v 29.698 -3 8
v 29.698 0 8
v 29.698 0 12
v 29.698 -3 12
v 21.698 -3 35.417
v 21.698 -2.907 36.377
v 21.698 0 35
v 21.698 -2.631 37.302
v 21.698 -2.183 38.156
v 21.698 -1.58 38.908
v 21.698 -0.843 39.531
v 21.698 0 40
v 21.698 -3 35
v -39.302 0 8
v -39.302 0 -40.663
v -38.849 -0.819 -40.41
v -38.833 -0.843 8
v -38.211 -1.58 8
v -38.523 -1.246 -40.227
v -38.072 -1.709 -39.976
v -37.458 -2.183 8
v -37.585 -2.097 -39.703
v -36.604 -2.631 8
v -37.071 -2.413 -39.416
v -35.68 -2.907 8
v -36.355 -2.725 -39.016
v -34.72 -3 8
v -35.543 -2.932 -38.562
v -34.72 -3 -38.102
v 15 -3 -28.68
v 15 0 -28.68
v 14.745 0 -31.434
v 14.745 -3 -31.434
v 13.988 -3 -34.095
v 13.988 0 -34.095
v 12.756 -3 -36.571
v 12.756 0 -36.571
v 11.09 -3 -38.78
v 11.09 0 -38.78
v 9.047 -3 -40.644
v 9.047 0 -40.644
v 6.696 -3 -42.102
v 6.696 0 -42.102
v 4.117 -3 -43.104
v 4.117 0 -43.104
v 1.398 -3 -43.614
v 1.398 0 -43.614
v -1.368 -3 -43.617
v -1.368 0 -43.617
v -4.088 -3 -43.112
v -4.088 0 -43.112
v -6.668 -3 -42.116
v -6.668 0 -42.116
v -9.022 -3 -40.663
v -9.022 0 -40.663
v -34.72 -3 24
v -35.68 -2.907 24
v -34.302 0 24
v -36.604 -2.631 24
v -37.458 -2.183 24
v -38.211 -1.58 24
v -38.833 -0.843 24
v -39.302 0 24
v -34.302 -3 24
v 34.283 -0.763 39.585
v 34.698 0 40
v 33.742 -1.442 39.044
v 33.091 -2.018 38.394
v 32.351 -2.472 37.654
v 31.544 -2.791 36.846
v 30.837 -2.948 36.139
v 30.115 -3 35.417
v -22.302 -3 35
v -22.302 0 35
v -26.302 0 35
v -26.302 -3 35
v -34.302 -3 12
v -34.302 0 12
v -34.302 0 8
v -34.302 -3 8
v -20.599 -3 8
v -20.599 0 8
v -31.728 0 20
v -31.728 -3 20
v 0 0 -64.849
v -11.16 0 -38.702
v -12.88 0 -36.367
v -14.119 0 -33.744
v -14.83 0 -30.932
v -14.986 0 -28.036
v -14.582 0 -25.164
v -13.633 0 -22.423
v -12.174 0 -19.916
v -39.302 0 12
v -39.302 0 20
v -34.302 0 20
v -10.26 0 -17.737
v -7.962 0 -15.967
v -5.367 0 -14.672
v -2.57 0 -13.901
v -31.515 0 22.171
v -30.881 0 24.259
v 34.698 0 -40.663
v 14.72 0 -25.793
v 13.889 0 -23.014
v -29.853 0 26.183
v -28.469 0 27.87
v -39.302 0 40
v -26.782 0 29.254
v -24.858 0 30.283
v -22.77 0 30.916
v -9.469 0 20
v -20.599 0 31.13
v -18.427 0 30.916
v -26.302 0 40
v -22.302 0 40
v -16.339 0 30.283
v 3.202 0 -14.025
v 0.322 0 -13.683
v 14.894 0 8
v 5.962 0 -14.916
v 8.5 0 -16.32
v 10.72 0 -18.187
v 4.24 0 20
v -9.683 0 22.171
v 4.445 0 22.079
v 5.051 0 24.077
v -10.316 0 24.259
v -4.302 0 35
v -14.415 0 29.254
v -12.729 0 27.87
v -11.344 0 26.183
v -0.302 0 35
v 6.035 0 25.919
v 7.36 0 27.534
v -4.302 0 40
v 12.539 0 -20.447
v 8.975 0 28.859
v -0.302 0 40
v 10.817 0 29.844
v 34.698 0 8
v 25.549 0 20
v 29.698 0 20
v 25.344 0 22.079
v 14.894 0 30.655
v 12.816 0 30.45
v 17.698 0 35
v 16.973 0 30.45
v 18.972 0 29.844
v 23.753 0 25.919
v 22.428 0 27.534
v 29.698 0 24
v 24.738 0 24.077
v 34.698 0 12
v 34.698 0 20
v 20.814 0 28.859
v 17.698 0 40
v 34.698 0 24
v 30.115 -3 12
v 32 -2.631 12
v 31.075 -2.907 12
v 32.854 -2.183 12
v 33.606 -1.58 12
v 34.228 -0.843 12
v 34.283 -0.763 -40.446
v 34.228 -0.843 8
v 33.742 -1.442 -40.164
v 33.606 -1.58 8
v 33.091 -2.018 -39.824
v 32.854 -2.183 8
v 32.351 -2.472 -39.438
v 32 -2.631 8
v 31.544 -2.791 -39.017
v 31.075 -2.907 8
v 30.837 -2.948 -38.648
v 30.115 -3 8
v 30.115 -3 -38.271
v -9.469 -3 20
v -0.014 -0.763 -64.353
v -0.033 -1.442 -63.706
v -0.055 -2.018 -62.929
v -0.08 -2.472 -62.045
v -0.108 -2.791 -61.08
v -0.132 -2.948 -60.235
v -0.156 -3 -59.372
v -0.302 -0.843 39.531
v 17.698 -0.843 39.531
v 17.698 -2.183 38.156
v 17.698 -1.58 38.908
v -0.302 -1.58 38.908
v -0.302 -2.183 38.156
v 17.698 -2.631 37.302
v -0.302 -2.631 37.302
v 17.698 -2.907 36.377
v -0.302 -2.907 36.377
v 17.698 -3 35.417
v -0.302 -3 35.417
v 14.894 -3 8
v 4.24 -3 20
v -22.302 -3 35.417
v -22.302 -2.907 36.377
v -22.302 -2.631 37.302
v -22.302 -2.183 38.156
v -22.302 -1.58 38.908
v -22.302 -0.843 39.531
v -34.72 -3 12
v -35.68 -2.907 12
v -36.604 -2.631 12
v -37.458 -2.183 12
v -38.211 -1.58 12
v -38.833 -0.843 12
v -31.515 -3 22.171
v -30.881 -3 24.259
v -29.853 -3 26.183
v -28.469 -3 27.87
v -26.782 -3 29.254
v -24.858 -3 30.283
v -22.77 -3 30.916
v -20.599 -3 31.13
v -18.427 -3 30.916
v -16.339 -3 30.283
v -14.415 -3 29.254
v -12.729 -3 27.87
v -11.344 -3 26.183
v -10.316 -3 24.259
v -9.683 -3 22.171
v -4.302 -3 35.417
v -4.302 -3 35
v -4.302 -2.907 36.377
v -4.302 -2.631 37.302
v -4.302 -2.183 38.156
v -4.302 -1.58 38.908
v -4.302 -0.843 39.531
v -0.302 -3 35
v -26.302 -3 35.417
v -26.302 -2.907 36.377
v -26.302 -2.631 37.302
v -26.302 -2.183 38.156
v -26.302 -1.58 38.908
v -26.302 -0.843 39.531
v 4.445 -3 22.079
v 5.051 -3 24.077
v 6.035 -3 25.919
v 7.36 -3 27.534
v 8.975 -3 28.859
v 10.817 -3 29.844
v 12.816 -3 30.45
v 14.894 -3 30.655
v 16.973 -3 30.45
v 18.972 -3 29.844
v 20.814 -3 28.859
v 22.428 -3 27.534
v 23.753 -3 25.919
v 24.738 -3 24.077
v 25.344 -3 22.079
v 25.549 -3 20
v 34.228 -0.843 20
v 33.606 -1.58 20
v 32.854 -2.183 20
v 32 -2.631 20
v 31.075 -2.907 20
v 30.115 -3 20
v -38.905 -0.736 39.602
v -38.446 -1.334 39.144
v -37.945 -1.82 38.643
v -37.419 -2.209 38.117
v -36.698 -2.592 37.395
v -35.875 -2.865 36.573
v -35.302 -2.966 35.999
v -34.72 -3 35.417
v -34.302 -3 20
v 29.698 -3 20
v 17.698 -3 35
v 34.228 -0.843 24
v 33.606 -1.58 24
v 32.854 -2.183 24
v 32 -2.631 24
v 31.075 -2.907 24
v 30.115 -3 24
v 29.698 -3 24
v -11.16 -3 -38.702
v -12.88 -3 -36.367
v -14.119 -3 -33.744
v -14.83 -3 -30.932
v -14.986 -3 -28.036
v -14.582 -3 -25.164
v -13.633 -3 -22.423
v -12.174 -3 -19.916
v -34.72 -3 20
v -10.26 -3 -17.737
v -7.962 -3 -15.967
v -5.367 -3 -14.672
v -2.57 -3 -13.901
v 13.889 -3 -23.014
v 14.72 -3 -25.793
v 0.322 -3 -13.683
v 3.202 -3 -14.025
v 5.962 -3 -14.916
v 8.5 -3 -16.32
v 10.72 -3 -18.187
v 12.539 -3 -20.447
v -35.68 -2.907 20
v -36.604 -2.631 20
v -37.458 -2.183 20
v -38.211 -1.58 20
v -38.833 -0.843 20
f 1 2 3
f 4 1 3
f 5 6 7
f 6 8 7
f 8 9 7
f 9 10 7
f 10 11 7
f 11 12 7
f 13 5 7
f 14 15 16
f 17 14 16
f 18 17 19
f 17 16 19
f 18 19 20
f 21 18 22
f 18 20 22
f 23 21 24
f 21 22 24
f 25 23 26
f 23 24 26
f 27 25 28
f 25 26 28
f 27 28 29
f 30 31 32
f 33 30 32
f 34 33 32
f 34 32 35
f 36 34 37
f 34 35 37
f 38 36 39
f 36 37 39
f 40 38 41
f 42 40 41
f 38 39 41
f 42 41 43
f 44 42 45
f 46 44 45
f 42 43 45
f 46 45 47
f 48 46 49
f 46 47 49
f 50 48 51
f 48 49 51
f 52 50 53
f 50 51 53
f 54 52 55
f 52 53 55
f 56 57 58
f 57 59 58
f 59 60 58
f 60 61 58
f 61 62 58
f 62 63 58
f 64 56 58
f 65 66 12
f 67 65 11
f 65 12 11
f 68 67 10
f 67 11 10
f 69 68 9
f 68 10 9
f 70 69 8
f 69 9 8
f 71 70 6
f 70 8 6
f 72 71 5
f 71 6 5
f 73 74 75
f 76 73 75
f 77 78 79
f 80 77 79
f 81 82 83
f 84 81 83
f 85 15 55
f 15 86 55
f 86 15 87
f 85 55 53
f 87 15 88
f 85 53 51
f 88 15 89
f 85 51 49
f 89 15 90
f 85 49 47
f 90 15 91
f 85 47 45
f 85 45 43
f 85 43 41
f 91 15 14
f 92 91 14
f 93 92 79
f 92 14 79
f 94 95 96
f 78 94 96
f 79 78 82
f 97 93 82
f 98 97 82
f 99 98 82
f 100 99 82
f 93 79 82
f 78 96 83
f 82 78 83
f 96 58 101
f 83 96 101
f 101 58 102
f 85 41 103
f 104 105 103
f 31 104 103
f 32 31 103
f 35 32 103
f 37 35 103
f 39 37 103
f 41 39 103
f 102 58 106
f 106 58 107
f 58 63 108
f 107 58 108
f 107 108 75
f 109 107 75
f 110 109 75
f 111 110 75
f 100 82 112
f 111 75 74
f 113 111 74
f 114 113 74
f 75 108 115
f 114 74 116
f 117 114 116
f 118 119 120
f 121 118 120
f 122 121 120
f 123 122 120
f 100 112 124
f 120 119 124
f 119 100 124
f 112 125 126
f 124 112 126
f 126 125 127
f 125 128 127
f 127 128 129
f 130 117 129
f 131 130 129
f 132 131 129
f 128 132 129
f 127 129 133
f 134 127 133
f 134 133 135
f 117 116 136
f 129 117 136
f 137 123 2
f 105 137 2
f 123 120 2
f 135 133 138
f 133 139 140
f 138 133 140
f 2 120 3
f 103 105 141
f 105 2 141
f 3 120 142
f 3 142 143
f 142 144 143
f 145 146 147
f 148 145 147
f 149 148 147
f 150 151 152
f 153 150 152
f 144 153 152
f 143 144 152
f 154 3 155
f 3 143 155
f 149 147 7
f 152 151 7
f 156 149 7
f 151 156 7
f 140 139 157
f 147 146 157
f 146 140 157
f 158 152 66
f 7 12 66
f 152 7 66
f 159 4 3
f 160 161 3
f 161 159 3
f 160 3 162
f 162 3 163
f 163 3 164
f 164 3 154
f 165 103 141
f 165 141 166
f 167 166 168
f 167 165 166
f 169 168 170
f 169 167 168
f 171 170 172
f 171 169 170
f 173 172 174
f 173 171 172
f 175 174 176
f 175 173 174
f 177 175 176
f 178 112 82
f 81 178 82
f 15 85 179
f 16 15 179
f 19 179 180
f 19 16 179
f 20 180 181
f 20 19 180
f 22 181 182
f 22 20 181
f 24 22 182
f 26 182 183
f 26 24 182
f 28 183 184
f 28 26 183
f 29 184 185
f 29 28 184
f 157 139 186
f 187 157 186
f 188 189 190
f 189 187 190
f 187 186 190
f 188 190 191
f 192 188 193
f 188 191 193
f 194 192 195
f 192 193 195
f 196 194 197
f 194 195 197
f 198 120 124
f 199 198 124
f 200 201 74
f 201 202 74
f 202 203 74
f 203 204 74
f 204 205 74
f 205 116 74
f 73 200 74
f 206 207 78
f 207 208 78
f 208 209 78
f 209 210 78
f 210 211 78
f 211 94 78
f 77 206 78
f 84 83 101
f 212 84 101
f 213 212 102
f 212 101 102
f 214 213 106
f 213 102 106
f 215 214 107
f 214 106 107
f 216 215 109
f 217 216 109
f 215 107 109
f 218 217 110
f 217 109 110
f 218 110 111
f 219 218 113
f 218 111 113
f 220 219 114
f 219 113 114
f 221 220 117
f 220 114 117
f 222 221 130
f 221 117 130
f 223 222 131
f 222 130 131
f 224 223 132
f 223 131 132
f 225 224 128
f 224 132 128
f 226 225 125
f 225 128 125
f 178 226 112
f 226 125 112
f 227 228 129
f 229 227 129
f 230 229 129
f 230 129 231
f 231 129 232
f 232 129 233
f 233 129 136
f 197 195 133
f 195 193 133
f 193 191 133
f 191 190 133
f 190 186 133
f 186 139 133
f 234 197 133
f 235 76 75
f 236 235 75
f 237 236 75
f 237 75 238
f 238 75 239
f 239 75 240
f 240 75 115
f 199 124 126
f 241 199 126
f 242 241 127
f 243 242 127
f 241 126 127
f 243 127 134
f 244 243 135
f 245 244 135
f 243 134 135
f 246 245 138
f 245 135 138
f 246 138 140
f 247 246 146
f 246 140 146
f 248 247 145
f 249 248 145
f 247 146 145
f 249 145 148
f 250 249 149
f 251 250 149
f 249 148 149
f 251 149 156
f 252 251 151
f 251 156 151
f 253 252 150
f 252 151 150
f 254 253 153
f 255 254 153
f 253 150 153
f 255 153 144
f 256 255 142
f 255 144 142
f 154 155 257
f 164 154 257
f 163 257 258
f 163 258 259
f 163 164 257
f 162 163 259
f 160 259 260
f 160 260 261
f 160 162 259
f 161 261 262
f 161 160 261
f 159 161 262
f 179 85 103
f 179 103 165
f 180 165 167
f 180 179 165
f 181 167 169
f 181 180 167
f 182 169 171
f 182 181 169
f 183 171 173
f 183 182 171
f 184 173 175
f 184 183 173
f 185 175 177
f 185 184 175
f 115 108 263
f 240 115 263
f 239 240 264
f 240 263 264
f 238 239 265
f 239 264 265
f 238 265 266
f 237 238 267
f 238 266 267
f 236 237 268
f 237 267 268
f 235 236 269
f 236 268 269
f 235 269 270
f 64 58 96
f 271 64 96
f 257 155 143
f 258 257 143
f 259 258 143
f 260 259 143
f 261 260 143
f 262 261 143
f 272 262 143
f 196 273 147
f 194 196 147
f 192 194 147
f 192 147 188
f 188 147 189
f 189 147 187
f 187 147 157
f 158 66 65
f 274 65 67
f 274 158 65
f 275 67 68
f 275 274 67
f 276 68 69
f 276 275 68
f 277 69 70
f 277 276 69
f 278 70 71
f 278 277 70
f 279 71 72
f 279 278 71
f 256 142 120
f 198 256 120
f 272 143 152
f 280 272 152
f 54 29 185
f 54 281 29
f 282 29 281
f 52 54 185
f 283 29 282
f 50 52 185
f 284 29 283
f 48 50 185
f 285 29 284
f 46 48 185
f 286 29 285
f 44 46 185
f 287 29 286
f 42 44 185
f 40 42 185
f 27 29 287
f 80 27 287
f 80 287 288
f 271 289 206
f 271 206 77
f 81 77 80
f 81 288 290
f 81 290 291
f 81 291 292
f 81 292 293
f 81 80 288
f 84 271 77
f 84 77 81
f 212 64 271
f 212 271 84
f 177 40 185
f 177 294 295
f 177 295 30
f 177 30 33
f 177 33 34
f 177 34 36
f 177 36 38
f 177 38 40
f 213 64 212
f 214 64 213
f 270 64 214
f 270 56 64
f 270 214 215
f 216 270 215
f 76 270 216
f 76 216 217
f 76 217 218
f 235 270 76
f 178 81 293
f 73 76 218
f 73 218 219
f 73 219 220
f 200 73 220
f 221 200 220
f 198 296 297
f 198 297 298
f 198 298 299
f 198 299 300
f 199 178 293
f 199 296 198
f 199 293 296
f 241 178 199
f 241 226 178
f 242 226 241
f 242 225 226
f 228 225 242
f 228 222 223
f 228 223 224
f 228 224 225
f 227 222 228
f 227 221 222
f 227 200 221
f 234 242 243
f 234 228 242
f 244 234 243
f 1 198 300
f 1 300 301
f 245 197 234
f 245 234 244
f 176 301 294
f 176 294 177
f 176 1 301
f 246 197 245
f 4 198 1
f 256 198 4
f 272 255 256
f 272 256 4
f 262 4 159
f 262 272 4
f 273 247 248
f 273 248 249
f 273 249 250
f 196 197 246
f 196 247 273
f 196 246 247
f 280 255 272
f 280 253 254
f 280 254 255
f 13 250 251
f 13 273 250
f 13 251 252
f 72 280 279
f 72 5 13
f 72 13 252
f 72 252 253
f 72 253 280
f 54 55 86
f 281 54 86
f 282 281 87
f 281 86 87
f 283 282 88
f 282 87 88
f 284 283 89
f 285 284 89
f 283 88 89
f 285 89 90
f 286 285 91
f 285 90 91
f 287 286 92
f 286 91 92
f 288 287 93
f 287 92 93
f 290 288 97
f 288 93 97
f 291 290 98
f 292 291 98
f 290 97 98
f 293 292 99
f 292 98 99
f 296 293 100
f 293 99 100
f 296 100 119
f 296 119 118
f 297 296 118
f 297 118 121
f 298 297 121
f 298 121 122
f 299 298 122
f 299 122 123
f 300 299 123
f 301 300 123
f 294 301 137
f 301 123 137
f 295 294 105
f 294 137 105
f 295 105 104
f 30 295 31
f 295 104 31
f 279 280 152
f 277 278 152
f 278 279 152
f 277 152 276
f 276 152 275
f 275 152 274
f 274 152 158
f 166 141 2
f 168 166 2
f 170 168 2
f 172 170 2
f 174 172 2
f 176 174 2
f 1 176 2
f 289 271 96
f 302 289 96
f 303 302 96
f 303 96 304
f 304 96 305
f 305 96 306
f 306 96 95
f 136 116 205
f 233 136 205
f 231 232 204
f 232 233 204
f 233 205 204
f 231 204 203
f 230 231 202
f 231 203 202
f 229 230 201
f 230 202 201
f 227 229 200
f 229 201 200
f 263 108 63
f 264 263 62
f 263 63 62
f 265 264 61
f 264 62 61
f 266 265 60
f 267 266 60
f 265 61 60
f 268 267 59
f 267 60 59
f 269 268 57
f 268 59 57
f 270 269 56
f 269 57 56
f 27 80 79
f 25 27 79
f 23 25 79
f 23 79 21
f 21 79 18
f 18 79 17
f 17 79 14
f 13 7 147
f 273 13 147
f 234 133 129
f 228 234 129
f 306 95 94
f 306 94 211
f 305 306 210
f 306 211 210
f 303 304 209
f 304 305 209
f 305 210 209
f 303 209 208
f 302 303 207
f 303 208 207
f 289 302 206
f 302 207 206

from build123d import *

# Parameters (mm, degrees)
F1_DEPTH     = 3
F2_T1_DEPTH  = 69.0608621697
F2_T3_DEPTH  = 65.2081986538
F2_T5_DEPTH  = 71.5756555765
F2_T7_DEPTH  = 30.9128784748
F2_T9_DEPTH  = 38.9128784748
F2_T11_DEPTH = 35.9128784748
F2_T13_DEPTH = 40.9128784748
F2_T15_DEPTH = 40.9128784748
F2_T17_DEPTH = 35.9128784748


# Not quite as in the source:
# - a fillet or chamfer that OpenCascade refuses, or shapes differently, is made with other operations: its cross-section is extruded or revolved along the edge and cut away or added


with BuildPart() as f1:
    # F0 (on Front) → F1 (new body)
    with BuildSketch(Plane.XZ):
        with BuildLine():
            Line((-39.3023127707, 0), (-39.3023127707, -40.6627771018))
            Line((-39.3023127707, -40.6627771018), (-9.0223597329, -40.6627771018))
            ThreePointArc((-9.0223597329, -40.6627771018), (-6.6956927949, -15.256923351), (15, -28.6795794964))
            ThreePointArc((15, -28.6795794964), (13.4226561454, -35.3752722912), (9.0223597329, -40.6627771018))
            Line((9.0223597329, -40.6627771018), (34.6976872293, -40.6627771018))
            Line((34.6976872293, -40.6627771018), (34.6976872293, 0))
            Line((34.6976872293, 0), (34.6976872293, 8))
            Line((34.6976872293, 8), (29.6976872293, 8))
            Line((29.6976872293, 8), (29.6976872293, 12))
            Line((29.6976872293, 12), (34.6976872293, 12))
            Line((34.6976872293, 12), (34.6976872293, 20))
            Line((34.6976872293, 20), (29.6976872293, 20))
            Line((29.6976872293, 20), (29.6976872293, 24))
            Line((29.6976872293, 24), (34.6976872293, 24))
            Line((34.6976872293, 24), (34.6976872293, 40))
            Line((34.6976872293, 40), (21.6976872293, 40))
            Line((21.6976872293, 40), (21.6976872293, 35))
            Line((21.6976872293, 35), (17.6976872293, 35))
            Line((17.6976872293, 35), (17.6976872293, 40))
            Line((17.6976872293, 40), (-0.3023127707, 40))
            Line((-0.3023127707, 40), (-0.3023127707, 35))
            Line((-0.3023127707, 35), (-4.3023127707, 35))
            Line((-4.3023127707, 35), (-4.3023127707, 40))
            Line((-4.3023127707, 40), (-22.3023127707, 40))
            Line((-22.3023127707, 40), (-22.3023127707, 35))
            Line((-22.3023127707, 35), (-26.3023127707, 35))
            Line((-26.3023127707, 35), (-26.3023127707, 40))
            Line((-26.3023127707, 40), (-39.3023127707, 40))
            Line((-39.3023127707, 40), (-39.3023127707, 24))
            Line((-39.3023127707, 24), (-34.3023127707, 24))
            Line((-34.3023127707, 24), (-34.3023127707, 20))
            Line((-34.3023127707, 20), (-39.3023127707, 20))
            Line((-39.3023127707, 20), (-39.3023127707, 12))
            Line((-39.3023127707, 12), (-34.3023127707, 12))
            Line((-34.3023127707, 12), (-34.3023127707, 8))
            Line((-34.3023127707, 8), (-39.3023127707, 8))
            Line((-39.3023127707, 8), (-39.3023127707, 0))
        make_face()
        with BuildLine():
            ThreePointArc((-31.7284863554, 20), (-20.5985922366, 31.1298941188), (-9.4686981178, 20))
            Line((-9.4686981178, 20), (-20.5985922366, 8))
            Line((-20.5985922366, 8), (-31.7284863554, 20))
        make_face(mode=Mode.SUBTRACT)
        with BuildLine():
            ThreePointArc((4.2398196727, 20), (14.8943690583, 30.6545493856), (25.5489184439, 20))
            Line((25.5489184439, 20), (14.8943690583, 8))
            Line((14.8943690583, 8), (4.2398196727, 20))
        make_face(mode=Mode.SUBTRACT)
        with BuildLine():
            Line((-9.0223597329, -40.6627771018), (-39.3023127707, -40.6627771018))
            Line((-39.3023127707, -40.6627771018), (0, -64.8488187371))
            Line((0, -64.8488187371), (34.6976872293, -40.6627771018))
            Line((34.6976872293, -40.6627771018), (9.0223597329, -40.6627771018))
            ThreePointArc((9.0223597329, -40.6627771018), (0, -43.6795794964), (-9.0223597329, -40.6627771018))
        make_face()
    extrude(amount=F1_DEPTH)

    # F2: fillet of radius 5 on 12 edges, made by hand

    # F2_s2 → F2_t1 (cut)
    with BuildSketch(Plane(origin=(-20.1138870842, 0, 12.3777782062), x_dir=(0, 1, 0), z_dir=(0.8516582876, 0, -0.5240974729))):
        with BuildLine():
            ThreePointArc((0, -55.2290339197), (-2.1833001327, -53.3850710123), (-3, -50.6464582247))
            Line((-3, -50.6464582247), (-3, -55.2290339197))
            Line((-3, -55.2290339197), (0, -55.2290339197))
        make_face()
    extrude(amount=F2_T1_DEPTH, mode=Mode.SUBTRACT)

    # F2_s4 → F2_t3 (cut)
    with BuildSketch(Plane(origin=(-39.8201349052, 0, -27.7566465561), x_dir=(0, 1, 0), z_dir=(0.8203670544, 0, 0.5718372986))):
        with BuildLine():
            ThreePointArc((0, -53.1998344073), (-2.1833001327, -51.3558714999), (-3, -48.6172587124))
            Line((-3, -48.6172587124), (-3, -53.1998344073))
            Line((-3, -53.1998344073), (0, -53.1998344073))
        make_face()
    extrude(amount=F2_T3_DEPTH, mode=Mode.SUBTRACT)

    # F2_s6 → F2_t5 (cut)
    with BuildSketch(Plane.XY.offset(-52.1192163392)):
        with BuildLine():
            ThreePointArc((-39.3023127707, 0), (-37.4583498632, -2.1833001327), (-34.7197370757, -3))
            Line((-34.7197370757, -3), (-39.3023127707, -3))
            Line((-39.3023127707, -3), (-39.3023127707, 0))
        make_face()
        with BuildLine():
            ThreePointArc((34.6976872293, 0), (32.8537243219, -2.1833001327), (30.1151115344, -3))
            Line((30.1151115344, -3), (34.6976872293, -3))
            Line((34.6976872293, -3), (34.6976872293, 0))
        make_face()
    extrude(amount=F2_T5_DEPTH, mode=Mode.SUBTRACT)

    # F2_s8 → F2_t7 (cut)
    with BuildSketch(Plane.XY.offset(0.5435607626)):
        with BuildLine():
            ThreePointArc((-39.3023127707, 0), (-37.4583498632, -2.1833001327), (-34.7197370757, -3))
            Line((-34.7197370757, -3), (-39.3023127707, -3))
            Line((-39.3023127707, -3), (-39.3023127707, 0))
        make_face()
        with BuildLine():
            ThreePointArc((34.6976872293, 0), (32.8537243219, -2.1833001327), (30.1151115344, -3))
            Line((30.1151115344, -3), (34.6976872293, -3))
            Line((34.6976872293, -3), (34.6976872293, 0))
        make_face()
    extrude(amount=F2_T7_DEPTH, mode=Mode.SUBTRACT)

    # F2_s10 → F2_t9 (cut)
    with BuildSketch(Plane.XY.offset(12.5435607626)):
        with BuildLine():
            ThreePointArc((-39.3023127707, 0), (-37.4583498632, -2.1833001327), (-34.7197370757, -3))
            Line((-34.7197370757, -3), (-39.3023127707, -3))
            Line((-39.3023127707, -3), (-39.3023127707, 0))
        make_face()
        with BuildLine():
            ThreePointArc((34.6976872293, 0), (32.8537243219, -2.1833001327), (30.1151115344, -3))
            Line((30.1151115344, -3), (34.6976872293, -3))
            Line((34.6976872293, -3), (34.6976872293, 0))
        make_face()
    extrude(amount=F2_T9_DEPTH, mode=Mode.SUBTRACT)

    # F2_s12 → F2_t11 (cut)
    with BuildSketch(Plane.YZ.offset(-50.7587520081)):
        with BuildLine():
            ThreePointArc((0, 40), (-2.1833001327, 38.1560370926), (-3, 35.417424305))
            Line((-3, 35.417424305), (-3, 40))
            Line((-3, 40), (0, 40))
        make_face()
    extrude(amount=F2_T11_DEPTH, mode=Mode.SUBTRACT)

    # F2_s14 → F2_t13 (cut)
    with BuildSketch(Plane.YZ.offset(-33.7587520081)):
        with BuildLine():
            ThreePointArc((0, 40), (-2.1833001327, 38.1560370926), (-3, 35.417424305))
            Line((-3, 35.417424305), (-3, 40))
            Line((-3, 40), (0, 40))
        make_face()
    extrude(amount=F2_T13_DEPTH, mode=Mode.SUBTRACT)

    # F2_s16 → F2_t15 (cut)
    with BuildSketch(Plane.YZ.offset(-11.7587520081)):
        with BuildLine():
            ThreePointArc((0, 40), (-2.1833001327, 38.1560370926), (-3, 35.417424305))
            Line((-3, 35.417424305), (-3, 40))
            Line((-3, 40), (0, 40))
        make_face()
    extrude(amount=F2_T15_DEPTH, mode=Mode.SUBTRACT)

    # F2_s18 → F2_t17 (cut)
    with BuildSketch(Plane.YZ.offset(10.2412479919)):
        with BuildLine():
            ThreePointArc((0, 40), (-2.1833001327, 38.1560370926), (-3, 35.417424305))
            Line((-3, 35.417424305), (-3, 40))
            Line((-3, 40), (0, 40))
        make_face()
    extrude(amount=F2_T17_DEPTH, mode=Mode.SUBTRACT)


solid = f1.part
